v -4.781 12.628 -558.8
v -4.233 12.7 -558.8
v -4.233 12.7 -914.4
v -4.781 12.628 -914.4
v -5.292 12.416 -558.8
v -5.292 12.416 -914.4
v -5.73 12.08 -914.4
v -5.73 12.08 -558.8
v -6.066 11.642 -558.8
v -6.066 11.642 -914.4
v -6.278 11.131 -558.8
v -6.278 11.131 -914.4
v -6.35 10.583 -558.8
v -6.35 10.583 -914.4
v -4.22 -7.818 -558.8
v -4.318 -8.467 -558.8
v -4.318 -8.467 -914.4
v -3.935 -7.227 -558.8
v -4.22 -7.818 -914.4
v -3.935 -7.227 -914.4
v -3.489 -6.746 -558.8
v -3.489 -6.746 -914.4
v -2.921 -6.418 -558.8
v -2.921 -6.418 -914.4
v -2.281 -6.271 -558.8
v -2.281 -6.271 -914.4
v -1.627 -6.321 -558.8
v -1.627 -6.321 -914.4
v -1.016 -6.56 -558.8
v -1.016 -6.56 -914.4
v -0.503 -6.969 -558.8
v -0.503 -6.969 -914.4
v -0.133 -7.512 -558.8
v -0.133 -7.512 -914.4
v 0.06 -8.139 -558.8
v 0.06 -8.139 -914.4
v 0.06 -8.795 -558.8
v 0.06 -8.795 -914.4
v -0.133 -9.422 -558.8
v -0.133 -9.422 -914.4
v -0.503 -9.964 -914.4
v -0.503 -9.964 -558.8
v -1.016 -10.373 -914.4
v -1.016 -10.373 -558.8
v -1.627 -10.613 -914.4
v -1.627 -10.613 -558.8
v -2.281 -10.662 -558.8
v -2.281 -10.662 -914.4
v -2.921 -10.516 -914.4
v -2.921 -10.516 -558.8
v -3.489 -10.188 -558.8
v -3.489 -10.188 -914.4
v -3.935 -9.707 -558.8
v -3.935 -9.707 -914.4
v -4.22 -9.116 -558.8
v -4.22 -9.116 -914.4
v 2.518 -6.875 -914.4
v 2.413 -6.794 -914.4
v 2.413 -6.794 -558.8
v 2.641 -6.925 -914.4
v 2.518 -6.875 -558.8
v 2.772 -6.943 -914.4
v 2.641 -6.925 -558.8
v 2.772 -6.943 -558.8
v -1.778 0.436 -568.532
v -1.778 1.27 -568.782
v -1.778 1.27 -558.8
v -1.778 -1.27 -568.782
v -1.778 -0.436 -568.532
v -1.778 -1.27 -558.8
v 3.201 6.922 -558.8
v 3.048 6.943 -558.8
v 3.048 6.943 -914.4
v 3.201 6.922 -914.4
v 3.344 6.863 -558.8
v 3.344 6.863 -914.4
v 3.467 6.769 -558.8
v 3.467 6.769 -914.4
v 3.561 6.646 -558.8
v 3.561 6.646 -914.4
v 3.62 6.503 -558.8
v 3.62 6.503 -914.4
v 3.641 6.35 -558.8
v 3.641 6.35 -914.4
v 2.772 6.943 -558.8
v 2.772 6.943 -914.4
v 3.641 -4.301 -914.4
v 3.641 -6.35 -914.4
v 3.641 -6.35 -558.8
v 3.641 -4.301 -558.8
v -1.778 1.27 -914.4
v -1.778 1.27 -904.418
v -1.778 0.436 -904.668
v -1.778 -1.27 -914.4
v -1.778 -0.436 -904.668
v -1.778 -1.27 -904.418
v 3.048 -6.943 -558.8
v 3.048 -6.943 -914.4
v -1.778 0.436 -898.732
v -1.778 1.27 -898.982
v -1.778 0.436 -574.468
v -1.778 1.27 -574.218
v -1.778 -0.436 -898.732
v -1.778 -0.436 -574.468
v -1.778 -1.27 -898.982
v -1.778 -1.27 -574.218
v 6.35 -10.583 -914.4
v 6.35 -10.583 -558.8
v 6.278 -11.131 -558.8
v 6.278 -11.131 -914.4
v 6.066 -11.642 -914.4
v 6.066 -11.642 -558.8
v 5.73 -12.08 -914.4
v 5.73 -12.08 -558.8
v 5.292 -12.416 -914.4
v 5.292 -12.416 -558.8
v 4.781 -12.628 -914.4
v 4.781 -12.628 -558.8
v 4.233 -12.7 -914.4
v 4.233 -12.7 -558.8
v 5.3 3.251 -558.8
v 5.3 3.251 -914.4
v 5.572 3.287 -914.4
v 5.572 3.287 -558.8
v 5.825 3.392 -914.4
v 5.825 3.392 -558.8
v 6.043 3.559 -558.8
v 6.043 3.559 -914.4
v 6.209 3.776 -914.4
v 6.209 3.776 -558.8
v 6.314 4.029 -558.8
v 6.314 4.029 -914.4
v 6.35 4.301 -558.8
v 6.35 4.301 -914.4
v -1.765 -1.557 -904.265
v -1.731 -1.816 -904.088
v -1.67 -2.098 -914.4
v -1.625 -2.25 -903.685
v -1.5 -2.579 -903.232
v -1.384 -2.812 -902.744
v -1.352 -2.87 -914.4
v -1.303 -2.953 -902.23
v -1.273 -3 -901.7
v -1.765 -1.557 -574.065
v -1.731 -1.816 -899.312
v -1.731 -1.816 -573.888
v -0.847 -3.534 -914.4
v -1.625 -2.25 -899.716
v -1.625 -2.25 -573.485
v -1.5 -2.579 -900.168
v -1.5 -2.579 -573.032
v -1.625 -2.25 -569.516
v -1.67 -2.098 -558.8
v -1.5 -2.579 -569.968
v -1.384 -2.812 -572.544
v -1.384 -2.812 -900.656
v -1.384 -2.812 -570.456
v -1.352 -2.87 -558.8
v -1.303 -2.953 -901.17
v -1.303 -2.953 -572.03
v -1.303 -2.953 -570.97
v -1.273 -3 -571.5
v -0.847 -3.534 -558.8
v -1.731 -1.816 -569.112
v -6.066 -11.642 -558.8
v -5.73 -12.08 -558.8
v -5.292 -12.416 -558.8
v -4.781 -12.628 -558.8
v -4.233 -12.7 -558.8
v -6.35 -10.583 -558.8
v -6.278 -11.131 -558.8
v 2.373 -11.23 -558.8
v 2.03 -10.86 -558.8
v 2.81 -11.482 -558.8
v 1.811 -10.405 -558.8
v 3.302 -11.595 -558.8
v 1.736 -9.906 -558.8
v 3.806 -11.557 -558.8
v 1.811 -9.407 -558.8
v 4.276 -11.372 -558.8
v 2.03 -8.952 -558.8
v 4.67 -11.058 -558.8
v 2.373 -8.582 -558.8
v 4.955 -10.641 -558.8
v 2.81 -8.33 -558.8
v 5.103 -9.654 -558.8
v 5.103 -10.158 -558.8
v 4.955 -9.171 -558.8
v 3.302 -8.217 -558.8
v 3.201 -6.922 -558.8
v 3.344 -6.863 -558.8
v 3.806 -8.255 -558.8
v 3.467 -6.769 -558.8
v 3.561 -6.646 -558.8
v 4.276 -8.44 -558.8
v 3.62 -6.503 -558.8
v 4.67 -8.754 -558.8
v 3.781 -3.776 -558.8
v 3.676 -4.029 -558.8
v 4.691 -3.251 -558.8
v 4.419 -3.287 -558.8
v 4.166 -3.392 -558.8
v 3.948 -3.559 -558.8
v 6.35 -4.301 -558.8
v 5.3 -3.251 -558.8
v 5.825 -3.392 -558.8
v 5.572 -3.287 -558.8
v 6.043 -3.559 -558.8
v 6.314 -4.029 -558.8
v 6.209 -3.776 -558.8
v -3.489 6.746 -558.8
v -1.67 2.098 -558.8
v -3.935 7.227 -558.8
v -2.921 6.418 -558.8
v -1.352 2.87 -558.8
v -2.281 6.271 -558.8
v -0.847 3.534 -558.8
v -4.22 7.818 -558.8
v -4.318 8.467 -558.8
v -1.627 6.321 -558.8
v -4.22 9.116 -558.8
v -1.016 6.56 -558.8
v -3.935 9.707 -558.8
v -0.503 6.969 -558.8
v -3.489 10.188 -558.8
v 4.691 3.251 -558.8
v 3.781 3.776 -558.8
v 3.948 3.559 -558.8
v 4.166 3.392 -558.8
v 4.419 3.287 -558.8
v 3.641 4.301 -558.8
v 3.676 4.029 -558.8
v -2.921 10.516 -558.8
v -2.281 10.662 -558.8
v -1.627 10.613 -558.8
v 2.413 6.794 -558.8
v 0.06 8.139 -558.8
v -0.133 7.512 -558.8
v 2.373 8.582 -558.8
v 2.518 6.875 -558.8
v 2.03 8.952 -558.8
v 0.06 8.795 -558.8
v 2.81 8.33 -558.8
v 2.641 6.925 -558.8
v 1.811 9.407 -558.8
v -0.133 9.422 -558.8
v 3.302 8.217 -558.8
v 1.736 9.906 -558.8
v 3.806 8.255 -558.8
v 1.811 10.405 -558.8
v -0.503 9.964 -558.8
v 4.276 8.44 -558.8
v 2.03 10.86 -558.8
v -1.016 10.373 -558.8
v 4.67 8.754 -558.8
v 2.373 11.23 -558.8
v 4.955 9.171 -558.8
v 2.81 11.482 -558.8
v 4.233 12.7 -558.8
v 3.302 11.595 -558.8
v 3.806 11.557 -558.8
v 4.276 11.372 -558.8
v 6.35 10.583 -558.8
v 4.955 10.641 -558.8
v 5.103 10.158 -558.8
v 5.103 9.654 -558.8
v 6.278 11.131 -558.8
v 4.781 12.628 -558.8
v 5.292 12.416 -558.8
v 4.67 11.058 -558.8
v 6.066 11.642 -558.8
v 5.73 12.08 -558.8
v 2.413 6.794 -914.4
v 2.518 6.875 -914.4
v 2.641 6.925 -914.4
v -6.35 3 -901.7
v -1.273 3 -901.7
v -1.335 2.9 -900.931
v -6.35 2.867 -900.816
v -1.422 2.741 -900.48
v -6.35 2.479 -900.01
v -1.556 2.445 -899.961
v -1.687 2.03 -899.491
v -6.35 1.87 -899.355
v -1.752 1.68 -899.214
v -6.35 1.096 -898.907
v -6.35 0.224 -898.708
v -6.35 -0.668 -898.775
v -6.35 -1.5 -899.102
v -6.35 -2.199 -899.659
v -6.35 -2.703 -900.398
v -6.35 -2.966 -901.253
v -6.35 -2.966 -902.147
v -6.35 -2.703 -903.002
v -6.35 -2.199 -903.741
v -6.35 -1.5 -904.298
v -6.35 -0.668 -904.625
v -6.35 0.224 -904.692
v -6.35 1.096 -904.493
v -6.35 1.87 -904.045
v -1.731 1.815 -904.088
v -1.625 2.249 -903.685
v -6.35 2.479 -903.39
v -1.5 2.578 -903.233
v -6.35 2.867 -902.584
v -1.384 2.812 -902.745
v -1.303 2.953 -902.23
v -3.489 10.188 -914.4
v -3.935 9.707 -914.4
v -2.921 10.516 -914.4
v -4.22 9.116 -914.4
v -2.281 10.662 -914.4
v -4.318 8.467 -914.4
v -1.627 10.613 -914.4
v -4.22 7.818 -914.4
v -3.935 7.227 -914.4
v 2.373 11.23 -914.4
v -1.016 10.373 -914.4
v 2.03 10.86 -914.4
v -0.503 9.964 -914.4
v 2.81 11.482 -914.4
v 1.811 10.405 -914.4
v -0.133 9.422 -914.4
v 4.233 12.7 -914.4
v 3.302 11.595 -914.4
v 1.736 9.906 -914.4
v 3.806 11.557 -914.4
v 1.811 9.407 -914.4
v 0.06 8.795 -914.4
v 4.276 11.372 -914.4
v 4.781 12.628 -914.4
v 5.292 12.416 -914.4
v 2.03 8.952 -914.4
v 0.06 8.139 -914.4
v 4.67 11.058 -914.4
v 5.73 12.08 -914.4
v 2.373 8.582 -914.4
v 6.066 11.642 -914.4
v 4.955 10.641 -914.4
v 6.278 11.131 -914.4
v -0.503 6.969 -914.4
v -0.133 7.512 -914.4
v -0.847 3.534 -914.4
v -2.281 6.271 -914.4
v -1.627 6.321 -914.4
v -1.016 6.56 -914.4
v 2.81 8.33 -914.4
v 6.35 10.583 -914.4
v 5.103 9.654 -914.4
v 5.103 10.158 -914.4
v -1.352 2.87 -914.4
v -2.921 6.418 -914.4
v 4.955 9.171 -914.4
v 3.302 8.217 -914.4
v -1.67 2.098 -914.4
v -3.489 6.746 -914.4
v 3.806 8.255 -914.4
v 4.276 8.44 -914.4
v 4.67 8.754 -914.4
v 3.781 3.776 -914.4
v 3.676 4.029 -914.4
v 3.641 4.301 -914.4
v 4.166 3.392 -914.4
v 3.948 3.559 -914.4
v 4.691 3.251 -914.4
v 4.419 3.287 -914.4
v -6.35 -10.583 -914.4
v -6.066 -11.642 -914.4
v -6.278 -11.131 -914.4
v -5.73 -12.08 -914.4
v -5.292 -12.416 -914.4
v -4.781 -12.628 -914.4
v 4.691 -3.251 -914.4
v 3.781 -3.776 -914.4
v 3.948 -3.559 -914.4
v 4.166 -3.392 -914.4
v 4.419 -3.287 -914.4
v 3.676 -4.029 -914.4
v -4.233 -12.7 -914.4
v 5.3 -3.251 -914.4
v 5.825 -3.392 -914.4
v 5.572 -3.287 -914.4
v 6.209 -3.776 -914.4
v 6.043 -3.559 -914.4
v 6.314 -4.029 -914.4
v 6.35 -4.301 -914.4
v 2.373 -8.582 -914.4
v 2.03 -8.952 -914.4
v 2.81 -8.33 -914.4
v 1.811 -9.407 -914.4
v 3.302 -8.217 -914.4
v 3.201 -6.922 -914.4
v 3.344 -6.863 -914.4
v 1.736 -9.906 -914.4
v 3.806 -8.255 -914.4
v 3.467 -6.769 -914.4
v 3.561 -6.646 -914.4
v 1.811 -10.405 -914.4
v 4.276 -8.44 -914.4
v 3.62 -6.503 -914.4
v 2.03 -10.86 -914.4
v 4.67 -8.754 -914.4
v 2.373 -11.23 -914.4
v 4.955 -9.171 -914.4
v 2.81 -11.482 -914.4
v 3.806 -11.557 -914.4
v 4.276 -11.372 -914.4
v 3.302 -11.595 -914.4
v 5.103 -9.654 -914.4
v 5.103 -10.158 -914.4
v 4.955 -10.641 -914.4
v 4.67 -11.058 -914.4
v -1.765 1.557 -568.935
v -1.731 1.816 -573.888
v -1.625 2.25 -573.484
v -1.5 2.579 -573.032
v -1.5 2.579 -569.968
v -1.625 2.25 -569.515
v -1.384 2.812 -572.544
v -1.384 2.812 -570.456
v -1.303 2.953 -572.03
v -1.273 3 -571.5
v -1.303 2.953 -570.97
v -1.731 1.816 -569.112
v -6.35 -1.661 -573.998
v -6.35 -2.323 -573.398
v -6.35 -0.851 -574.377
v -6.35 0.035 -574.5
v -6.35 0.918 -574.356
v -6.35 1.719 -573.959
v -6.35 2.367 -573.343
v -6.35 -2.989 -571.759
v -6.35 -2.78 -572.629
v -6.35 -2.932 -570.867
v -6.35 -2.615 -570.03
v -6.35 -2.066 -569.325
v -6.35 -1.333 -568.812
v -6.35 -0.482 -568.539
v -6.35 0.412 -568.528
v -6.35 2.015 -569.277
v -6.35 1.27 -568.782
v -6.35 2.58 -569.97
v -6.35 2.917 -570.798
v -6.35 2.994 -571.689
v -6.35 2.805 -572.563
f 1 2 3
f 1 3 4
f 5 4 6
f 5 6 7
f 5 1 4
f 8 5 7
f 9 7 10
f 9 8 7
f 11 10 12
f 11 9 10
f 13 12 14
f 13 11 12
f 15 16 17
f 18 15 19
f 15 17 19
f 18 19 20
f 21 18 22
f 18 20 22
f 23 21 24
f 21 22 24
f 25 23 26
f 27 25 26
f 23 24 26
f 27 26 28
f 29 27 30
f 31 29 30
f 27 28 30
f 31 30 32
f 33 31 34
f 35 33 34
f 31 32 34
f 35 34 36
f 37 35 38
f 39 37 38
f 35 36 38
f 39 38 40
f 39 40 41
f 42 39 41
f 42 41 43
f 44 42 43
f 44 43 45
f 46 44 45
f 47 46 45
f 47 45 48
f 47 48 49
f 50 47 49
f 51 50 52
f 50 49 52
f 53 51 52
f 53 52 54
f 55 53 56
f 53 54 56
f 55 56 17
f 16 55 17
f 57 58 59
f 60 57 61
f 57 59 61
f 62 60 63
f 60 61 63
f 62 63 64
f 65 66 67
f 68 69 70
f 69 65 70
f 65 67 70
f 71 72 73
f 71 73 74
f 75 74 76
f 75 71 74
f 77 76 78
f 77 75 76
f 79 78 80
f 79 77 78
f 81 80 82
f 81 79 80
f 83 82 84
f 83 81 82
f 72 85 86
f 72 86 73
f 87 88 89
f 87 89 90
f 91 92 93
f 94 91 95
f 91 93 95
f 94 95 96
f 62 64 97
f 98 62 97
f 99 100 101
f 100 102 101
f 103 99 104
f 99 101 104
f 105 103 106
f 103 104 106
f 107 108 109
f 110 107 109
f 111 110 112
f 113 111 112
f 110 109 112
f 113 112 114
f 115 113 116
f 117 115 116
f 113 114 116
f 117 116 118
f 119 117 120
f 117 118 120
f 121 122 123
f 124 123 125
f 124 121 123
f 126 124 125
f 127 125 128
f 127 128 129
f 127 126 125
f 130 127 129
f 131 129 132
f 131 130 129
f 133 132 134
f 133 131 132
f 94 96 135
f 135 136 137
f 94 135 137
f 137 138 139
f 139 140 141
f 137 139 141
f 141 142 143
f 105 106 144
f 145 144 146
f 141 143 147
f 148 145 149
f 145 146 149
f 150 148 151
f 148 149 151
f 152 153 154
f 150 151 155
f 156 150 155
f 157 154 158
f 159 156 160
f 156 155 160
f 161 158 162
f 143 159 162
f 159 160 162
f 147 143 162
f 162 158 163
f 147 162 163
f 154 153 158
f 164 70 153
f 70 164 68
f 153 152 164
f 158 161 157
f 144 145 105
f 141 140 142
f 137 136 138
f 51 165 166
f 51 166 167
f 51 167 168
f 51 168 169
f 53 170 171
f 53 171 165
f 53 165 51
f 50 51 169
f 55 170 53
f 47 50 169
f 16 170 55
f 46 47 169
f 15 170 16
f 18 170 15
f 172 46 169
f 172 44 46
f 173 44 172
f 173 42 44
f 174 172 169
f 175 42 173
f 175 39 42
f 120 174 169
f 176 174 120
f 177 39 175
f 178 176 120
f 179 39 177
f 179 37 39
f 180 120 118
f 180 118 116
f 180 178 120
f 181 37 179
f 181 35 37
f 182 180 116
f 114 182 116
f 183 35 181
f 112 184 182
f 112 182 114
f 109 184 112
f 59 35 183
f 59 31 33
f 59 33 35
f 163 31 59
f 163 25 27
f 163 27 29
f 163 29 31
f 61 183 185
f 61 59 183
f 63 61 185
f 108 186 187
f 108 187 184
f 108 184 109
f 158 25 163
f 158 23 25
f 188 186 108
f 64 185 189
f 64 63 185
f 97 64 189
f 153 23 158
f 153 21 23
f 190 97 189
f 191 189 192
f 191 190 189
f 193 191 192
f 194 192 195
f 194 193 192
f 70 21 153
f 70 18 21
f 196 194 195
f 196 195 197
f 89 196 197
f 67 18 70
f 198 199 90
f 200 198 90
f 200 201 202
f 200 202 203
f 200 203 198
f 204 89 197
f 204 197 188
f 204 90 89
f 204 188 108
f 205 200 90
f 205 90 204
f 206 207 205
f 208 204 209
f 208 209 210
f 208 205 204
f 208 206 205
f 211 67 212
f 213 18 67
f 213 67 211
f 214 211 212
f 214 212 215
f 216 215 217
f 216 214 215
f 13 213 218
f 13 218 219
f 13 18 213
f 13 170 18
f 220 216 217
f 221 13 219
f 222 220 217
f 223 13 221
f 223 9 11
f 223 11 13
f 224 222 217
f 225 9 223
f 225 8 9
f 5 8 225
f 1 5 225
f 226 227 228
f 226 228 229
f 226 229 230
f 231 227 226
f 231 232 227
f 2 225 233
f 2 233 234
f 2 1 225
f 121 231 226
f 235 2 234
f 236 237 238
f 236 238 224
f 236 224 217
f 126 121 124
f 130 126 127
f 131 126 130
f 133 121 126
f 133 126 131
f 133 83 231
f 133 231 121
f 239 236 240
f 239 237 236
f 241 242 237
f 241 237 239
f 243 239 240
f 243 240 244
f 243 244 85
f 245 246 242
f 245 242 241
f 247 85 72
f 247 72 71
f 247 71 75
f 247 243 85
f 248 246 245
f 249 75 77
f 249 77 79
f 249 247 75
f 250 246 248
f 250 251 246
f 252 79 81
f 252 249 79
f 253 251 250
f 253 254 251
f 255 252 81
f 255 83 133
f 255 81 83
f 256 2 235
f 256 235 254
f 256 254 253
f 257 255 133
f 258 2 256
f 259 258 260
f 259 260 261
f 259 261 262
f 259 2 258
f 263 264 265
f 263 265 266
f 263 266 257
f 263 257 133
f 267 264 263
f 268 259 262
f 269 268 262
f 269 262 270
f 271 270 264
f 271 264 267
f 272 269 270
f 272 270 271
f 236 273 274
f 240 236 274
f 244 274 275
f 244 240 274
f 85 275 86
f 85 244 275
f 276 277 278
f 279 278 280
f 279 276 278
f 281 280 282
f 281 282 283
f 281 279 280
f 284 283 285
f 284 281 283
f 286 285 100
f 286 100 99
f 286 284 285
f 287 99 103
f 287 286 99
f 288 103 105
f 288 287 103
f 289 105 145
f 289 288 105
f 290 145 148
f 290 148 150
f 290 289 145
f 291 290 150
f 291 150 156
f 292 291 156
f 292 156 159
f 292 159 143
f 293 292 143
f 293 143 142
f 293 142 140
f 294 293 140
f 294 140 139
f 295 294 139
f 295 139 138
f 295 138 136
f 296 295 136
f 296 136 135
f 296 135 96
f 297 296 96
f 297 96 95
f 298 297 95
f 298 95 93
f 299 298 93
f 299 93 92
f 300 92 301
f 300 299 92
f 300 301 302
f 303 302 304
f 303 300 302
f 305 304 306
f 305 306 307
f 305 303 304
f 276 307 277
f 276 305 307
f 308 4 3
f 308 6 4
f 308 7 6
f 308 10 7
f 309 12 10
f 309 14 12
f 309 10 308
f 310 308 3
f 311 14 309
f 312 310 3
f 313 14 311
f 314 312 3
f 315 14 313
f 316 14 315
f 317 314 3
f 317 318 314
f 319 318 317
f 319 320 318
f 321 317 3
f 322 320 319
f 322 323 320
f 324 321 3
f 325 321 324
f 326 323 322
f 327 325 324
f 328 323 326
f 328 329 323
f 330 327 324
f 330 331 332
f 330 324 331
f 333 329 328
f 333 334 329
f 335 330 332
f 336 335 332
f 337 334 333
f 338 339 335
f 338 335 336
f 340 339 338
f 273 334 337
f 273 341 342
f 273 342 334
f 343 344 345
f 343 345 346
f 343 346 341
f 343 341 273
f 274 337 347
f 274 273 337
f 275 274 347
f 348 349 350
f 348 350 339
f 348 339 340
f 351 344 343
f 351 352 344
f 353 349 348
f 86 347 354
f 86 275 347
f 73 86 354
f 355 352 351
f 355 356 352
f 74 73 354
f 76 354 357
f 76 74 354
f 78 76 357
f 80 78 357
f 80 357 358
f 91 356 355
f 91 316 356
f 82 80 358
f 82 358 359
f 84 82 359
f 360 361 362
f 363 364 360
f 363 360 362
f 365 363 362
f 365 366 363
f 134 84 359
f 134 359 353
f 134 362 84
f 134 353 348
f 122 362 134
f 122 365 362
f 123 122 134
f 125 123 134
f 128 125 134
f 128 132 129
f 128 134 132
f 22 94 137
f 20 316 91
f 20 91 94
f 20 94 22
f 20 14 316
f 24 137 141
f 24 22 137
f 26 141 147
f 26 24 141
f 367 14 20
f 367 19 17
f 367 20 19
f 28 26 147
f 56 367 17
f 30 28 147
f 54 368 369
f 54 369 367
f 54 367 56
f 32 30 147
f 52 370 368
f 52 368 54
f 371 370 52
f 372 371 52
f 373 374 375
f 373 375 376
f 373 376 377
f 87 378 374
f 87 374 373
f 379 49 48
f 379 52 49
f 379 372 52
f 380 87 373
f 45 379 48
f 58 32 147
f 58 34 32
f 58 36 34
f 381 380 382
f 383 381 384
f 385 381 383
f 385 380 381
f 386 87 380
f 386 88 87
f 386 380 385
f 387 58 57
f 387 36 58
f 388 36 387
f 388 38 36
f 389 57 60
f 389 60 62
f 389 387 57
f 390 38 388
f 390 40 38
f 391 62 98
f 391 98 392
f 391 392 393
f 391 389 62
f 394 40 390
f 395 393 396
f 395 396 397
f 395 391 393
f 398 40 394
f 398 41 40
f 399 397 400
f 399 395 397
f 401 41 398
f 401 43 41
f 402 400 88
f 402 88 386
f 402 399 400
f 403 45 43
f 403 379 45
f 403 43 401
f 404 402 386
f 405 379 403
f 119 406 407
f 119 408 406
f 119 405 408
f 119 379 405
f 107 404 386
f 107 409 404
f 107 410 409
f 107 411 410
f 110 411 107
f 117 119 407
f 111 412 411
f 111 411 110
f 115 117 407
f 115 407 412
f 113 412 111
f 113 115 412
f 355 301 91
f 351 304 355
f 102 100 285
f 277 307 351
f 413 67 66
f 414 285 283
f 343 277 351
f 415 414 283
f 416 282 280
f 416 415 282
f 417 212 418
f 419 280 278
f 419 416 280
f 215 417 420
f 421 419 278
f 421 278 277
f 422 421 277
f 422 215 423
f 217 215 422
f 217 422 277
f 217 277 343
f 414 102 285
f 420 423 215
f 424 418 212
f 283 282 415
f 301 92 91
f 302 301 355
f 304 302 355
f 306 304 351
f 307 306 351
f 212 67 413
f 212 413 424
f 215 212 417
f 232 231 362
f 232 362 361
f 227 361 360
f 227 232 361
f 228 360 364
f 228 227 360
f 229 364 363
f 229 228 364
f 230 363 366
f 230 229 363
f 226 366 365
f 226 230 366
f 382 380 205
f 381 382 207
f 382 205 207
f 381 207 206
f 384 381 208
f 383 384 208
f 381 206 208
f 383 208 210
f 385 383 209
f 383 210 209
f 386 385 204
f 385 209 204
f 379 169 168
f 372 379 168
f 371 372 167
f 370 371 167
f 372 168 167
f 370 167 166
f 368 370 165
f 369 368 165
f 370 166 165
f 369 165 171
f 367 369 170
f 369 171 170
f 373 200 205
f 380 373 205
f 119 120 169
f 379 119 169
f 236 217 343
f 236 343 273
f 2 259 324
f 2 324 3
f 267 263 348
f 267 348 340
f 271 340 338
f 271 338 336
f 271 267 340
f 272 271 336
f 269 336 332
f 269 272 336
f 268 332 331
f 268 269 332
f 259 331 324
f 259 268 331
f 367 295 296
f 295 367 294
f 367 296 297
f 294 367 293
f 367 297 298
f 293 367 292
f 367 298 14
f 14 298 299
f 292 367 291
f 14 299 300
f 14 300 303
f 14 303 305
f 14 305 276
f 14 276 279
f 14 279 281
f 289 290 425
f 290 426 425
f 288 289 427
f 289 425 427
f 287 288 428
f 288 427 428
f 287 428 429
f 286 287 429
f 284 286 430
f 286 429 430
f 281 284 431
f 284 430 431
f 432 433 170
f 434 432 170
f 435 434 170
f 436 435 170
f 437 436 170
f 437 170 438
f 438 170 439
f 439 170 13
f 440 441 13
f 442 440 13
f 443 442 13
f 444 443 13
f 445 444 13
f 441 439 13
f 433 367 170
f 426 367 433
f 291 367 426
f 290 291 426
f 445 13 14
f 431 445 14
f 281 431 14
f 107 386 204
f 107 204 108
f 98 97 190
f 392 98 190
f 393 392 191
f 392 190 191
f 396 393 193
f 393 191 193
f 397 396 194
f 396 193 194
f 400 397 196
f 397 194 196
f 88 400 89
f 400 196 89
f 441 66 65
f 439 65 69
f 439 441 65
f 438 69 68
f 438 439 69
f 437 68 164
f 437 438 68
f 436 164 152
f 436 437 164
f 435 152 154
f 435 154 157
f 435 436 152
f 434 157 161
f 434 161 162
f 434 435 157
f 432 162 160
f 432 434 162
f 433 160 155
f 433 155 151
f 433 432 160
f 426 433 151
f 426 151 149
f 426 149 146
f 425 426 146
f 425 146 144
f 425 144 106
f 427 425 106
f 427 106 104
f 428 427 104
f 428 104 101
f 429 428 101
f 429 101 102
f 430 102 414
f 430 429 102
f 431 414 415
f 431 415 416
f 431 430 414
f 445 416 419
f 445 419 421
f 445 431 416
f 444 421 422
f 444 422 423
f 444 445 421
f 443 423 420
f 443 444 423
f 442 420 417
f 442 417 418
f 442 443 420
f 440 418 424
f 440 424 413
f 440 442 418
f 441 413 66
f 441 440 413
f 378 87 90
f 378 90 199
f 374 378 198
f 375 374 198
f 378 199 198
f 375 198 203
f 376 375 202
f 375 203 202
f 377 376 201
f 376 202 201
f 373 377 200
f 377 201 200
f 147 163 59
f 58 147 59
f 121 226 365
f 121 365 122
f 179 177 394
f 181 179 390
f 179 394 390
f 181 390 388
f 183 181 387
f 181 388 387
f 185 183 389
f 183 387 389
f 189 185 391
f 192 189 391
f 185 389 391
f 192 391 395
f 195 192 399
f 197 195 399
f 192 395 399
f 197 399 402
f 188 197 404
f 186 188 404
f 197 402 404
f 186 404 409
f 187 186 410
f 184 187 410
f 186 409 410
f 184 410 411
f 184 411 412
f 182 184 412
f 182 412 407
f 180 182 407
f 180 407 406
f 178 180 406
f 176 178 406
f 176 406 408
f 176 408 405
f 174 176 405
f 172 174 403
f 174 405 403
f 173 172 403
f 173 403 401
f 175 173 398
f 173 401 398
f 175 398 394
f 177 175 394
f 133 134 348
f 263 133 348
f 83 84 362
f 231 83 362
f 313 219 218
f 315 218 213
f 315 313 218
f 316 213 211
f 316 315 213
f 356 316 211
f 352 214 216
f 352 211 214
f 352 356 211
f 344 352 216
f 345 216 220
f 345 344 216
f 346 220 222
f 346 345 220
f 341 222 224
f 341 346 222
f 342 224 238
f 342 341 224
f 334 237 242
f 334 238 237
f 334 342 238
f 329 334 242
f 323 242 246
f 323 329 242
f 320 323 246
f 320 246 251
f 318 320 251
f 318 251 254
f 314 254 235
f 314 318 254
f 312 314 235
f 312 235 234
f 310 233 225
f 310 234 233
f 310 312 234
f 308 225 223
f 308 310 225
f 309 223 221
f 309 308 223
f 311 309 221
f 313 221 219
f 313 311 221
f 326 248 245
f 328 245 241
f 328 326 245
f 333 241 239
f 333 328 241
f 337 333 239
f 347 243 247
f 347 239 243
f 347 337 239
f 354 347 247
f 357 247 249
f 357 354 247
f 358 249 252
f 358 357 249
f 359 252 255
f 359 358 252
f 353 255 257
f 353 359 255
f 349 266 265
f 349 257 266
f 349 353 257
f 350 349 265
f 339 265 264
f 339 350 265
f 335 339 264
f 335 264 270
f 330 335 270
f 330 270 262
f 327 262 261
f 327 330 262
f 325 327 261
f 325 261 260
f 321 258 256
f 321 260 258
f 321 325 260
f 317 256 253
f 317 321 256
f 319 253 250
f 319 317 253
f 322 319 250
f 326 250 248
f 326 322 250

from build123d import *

# Parameters (mm, degrees)
SKETCH3_R               = 2.201333333
SKETCH3_R_2             = 1.693333333
BOSS_EXTRUDE1_DEPTH     = 914.4
CUT_EXTRUDE1_DEPTH      = 1473.2
CUT_EXTRUDE2_DEPTH      = 915.524310439
CUT_EXTRUDE2_DEPTH_BACK = 915.524310439
SKETCH6_R               = 3


with BuildPart() as part:
    # Sketch3 → Boss-Extrude1 (new, symmetric)
    with BuildSketch(Plane.XY):
        with BuildLine():
            Line((-1.778, 0), (-1.778, 1.27))
            ThreePointArc((-1.778, 1.27), (-1.536070654, 2.494011801), (-0.846666667, 3.533942971))
            Line((-0.846666667, 3.533942971), (2.413267273, 6.793876912))
            ThreePointArc((2.413267273, 6.793876912), (2.578074335, 6.903997469), (2.772477518, 6.942666667))
            Line((2.772477518, 6.942666667), (3.048, 6.942666667))
            ThreePointArc((3.048, 6.942666667), (3.467078619, 6.769078619), (3.640666667, 6.35))
            Line((3.640666667, 6.35), (3.640666667, 4.301066667))
            ThreePointArc((3.640666667, 4.301066667), (3.948165494, 3.558698827), (4.690533333, 3.2512))
            Line((4.690533333, 3.2512), (5.300133333, 3.2512))
            ThreePointArc((5.300133333, 3.2512), (6.042501173, 3.558698827), (6.35, 4.301066667))
            Line((6.35, 4.301066667), (6.35, 10.583333333))
            ThreePointArc((6.35, 10.583333333), (5.730042687, 12.080042687), (4.233333333, 12.7))
            Line((4.233333333, 12.7), (-4.233333333, 12.7))
            ThreePointArc((-4.233333333, 12.7), (-5.730042687, 12.080042687), (-6.35, 10.583333333))
            Line((-6.35, 10.583333333), (-6.35, 0))
            Line((-6.35, 0), (-1.778, 0))
        make_face()
        with Locations(Location((-2.116666667, 8.466666667, 0), (0, 0, 180))):
            Circle(SKETCH3_R, mode=Mode.SUBTRACT)
        with Locations(Location((3.429, 9.906, 0), (0, 0, 180))):
            Circle(SKETCH3_R_2, mode=Mode.SUBTRACT)
    extrude(amount=BOSS_EXTRUDE1_DEPTH, both=True)

    # Mirror1: part across plane


with BuildPart() as part_1:
    add(part.part)
    add(part.part.mirror(Plane.ZX))

    # Sketch5 → Cut-Extrude1 (cut)
    with BuildSketch(Plane.XY.offset(914.4)):
        with BuildLine():
            Line((-6.35, 10.583333333), (-6.35, -10.583333333))
            ThreePointArc((-6.35, -10.583333333), (-5.730042687, -12.080042687), (-4.233333333, -12.7))
            Line((-4.233333333, -12.7), (4.233333333, -12.7))
            ThreePointArc((4.233333333, -12.7), (5.730042687, -12.080042687), (6.35, -10.583333333))
            Line((6.35, -10.583333333), (6.35, -4.301066667))
            ThreePointArc((6.35, -4.301066667), (6.042501173, -3.558698827), (5.300133333, -3.2512))
            Line((5.300133333, -3.2512), (4.690533333, -3.2512))
            ThreePointArc((4.690533333, -3.2512), (3.948165494, -3.558698827), (3.640666667, -4.301066667))
            Line((3.640666667, -4.301066667), (3.640666667, -6.35))
            ThreePointArc((3.640666667, -6.35), (3.467078619, -6.769078619), (3.048, -6.942666667))
            Line((3.048, -6.942666667), (2.772477518, -6.942666667))
            ThreePointArc((2.772477518, -6.942666667), (2.578074335, -6.903997469), (2.413267273, -6.793876912))
            Line((2.413267273, -6.793876912), (-0.846666667, -3.533942971))
            ThreePointArc((-0.846666667, -3.533942971), (-1.536070654, -2.494011801), (-1.778, -1.27))
            Line((-1.778, -1.27), (-1.778, 1.27))
            ThreePointArc((-1.778, 1.27), (-1.536070654, 2.494011801), (-0.846666667, 3.533942971))
            Line((-0.846666667, 3.533942971), (2.413267273, 6.793876912))
            ThreePointArc((2.413267273, 6.793876912), (2.578074335, 6.903997469), (2.772477518, 6.942666667))
            Line((2.772477518, 6.942666667), (3.048, 6.942666667))
            ThreePointArc((3.048, 6.942666667), (3.467078619, 6.769078619), (3.640666667, 6.35))
            Line((3.640666667, 6.35), (3.640666667, 4.301066667))
            ThreePointArc((3.640666667, 4.301066667), (3.948165494, 3.558698827), (4.690533333, 3.2512))
            Line((4.690533333, 3.2512), (5.300133333, 3.2512))
            ThreePointArc((5.300133333, 3.2512), (6.042501173, 3.558698827), (6.35, 4.301066667))
            Line((6.35, 4.301066667), (6.35, 10.583333333))
            ThreePointArc((6.35, 10.583333333), (5.730042687, 12.080042687), (4.233333333, 12.7))
            Line((4.233333333, 12.7), (-4.233333333, 12.7))
            ThreePointArc((-4.233333333, 12.7), (-5.730042687, 12.080042687), (-6.35, 10.583333333))
        make_face()
    extrude(amount=-CUT_EXTRUDE1_DEPTH, mode=Mode.SUBTRACT)

    # Sketch6 → Cut-Extrude2 (cut, two sides: drawn at the far end of the back side and taken through both)
    with BuildSketch(Plane(origin=(-1.778, 0, 0), x_dir=(0, 0, -1), z_dir=(1, 0, 0)).offset(-CUT_EXTRUDE2_DEPTH_BACK)):
        with Locations(Location((901.7, 0, 0), (0, 0, 90))):
            Circle(SKETCH6_R)
        with Locations(Location((571.5, 0, 0), (0, 0, 154.954785638))):
            Circle(SKETCH6_R)
    extrude(amount=CUT_EXTRUDE2_DEPTH + CUT_EXTRUDE2_DEPTH_BACK, mode=Mode.SUBTRACT)


solid = part_1.part
